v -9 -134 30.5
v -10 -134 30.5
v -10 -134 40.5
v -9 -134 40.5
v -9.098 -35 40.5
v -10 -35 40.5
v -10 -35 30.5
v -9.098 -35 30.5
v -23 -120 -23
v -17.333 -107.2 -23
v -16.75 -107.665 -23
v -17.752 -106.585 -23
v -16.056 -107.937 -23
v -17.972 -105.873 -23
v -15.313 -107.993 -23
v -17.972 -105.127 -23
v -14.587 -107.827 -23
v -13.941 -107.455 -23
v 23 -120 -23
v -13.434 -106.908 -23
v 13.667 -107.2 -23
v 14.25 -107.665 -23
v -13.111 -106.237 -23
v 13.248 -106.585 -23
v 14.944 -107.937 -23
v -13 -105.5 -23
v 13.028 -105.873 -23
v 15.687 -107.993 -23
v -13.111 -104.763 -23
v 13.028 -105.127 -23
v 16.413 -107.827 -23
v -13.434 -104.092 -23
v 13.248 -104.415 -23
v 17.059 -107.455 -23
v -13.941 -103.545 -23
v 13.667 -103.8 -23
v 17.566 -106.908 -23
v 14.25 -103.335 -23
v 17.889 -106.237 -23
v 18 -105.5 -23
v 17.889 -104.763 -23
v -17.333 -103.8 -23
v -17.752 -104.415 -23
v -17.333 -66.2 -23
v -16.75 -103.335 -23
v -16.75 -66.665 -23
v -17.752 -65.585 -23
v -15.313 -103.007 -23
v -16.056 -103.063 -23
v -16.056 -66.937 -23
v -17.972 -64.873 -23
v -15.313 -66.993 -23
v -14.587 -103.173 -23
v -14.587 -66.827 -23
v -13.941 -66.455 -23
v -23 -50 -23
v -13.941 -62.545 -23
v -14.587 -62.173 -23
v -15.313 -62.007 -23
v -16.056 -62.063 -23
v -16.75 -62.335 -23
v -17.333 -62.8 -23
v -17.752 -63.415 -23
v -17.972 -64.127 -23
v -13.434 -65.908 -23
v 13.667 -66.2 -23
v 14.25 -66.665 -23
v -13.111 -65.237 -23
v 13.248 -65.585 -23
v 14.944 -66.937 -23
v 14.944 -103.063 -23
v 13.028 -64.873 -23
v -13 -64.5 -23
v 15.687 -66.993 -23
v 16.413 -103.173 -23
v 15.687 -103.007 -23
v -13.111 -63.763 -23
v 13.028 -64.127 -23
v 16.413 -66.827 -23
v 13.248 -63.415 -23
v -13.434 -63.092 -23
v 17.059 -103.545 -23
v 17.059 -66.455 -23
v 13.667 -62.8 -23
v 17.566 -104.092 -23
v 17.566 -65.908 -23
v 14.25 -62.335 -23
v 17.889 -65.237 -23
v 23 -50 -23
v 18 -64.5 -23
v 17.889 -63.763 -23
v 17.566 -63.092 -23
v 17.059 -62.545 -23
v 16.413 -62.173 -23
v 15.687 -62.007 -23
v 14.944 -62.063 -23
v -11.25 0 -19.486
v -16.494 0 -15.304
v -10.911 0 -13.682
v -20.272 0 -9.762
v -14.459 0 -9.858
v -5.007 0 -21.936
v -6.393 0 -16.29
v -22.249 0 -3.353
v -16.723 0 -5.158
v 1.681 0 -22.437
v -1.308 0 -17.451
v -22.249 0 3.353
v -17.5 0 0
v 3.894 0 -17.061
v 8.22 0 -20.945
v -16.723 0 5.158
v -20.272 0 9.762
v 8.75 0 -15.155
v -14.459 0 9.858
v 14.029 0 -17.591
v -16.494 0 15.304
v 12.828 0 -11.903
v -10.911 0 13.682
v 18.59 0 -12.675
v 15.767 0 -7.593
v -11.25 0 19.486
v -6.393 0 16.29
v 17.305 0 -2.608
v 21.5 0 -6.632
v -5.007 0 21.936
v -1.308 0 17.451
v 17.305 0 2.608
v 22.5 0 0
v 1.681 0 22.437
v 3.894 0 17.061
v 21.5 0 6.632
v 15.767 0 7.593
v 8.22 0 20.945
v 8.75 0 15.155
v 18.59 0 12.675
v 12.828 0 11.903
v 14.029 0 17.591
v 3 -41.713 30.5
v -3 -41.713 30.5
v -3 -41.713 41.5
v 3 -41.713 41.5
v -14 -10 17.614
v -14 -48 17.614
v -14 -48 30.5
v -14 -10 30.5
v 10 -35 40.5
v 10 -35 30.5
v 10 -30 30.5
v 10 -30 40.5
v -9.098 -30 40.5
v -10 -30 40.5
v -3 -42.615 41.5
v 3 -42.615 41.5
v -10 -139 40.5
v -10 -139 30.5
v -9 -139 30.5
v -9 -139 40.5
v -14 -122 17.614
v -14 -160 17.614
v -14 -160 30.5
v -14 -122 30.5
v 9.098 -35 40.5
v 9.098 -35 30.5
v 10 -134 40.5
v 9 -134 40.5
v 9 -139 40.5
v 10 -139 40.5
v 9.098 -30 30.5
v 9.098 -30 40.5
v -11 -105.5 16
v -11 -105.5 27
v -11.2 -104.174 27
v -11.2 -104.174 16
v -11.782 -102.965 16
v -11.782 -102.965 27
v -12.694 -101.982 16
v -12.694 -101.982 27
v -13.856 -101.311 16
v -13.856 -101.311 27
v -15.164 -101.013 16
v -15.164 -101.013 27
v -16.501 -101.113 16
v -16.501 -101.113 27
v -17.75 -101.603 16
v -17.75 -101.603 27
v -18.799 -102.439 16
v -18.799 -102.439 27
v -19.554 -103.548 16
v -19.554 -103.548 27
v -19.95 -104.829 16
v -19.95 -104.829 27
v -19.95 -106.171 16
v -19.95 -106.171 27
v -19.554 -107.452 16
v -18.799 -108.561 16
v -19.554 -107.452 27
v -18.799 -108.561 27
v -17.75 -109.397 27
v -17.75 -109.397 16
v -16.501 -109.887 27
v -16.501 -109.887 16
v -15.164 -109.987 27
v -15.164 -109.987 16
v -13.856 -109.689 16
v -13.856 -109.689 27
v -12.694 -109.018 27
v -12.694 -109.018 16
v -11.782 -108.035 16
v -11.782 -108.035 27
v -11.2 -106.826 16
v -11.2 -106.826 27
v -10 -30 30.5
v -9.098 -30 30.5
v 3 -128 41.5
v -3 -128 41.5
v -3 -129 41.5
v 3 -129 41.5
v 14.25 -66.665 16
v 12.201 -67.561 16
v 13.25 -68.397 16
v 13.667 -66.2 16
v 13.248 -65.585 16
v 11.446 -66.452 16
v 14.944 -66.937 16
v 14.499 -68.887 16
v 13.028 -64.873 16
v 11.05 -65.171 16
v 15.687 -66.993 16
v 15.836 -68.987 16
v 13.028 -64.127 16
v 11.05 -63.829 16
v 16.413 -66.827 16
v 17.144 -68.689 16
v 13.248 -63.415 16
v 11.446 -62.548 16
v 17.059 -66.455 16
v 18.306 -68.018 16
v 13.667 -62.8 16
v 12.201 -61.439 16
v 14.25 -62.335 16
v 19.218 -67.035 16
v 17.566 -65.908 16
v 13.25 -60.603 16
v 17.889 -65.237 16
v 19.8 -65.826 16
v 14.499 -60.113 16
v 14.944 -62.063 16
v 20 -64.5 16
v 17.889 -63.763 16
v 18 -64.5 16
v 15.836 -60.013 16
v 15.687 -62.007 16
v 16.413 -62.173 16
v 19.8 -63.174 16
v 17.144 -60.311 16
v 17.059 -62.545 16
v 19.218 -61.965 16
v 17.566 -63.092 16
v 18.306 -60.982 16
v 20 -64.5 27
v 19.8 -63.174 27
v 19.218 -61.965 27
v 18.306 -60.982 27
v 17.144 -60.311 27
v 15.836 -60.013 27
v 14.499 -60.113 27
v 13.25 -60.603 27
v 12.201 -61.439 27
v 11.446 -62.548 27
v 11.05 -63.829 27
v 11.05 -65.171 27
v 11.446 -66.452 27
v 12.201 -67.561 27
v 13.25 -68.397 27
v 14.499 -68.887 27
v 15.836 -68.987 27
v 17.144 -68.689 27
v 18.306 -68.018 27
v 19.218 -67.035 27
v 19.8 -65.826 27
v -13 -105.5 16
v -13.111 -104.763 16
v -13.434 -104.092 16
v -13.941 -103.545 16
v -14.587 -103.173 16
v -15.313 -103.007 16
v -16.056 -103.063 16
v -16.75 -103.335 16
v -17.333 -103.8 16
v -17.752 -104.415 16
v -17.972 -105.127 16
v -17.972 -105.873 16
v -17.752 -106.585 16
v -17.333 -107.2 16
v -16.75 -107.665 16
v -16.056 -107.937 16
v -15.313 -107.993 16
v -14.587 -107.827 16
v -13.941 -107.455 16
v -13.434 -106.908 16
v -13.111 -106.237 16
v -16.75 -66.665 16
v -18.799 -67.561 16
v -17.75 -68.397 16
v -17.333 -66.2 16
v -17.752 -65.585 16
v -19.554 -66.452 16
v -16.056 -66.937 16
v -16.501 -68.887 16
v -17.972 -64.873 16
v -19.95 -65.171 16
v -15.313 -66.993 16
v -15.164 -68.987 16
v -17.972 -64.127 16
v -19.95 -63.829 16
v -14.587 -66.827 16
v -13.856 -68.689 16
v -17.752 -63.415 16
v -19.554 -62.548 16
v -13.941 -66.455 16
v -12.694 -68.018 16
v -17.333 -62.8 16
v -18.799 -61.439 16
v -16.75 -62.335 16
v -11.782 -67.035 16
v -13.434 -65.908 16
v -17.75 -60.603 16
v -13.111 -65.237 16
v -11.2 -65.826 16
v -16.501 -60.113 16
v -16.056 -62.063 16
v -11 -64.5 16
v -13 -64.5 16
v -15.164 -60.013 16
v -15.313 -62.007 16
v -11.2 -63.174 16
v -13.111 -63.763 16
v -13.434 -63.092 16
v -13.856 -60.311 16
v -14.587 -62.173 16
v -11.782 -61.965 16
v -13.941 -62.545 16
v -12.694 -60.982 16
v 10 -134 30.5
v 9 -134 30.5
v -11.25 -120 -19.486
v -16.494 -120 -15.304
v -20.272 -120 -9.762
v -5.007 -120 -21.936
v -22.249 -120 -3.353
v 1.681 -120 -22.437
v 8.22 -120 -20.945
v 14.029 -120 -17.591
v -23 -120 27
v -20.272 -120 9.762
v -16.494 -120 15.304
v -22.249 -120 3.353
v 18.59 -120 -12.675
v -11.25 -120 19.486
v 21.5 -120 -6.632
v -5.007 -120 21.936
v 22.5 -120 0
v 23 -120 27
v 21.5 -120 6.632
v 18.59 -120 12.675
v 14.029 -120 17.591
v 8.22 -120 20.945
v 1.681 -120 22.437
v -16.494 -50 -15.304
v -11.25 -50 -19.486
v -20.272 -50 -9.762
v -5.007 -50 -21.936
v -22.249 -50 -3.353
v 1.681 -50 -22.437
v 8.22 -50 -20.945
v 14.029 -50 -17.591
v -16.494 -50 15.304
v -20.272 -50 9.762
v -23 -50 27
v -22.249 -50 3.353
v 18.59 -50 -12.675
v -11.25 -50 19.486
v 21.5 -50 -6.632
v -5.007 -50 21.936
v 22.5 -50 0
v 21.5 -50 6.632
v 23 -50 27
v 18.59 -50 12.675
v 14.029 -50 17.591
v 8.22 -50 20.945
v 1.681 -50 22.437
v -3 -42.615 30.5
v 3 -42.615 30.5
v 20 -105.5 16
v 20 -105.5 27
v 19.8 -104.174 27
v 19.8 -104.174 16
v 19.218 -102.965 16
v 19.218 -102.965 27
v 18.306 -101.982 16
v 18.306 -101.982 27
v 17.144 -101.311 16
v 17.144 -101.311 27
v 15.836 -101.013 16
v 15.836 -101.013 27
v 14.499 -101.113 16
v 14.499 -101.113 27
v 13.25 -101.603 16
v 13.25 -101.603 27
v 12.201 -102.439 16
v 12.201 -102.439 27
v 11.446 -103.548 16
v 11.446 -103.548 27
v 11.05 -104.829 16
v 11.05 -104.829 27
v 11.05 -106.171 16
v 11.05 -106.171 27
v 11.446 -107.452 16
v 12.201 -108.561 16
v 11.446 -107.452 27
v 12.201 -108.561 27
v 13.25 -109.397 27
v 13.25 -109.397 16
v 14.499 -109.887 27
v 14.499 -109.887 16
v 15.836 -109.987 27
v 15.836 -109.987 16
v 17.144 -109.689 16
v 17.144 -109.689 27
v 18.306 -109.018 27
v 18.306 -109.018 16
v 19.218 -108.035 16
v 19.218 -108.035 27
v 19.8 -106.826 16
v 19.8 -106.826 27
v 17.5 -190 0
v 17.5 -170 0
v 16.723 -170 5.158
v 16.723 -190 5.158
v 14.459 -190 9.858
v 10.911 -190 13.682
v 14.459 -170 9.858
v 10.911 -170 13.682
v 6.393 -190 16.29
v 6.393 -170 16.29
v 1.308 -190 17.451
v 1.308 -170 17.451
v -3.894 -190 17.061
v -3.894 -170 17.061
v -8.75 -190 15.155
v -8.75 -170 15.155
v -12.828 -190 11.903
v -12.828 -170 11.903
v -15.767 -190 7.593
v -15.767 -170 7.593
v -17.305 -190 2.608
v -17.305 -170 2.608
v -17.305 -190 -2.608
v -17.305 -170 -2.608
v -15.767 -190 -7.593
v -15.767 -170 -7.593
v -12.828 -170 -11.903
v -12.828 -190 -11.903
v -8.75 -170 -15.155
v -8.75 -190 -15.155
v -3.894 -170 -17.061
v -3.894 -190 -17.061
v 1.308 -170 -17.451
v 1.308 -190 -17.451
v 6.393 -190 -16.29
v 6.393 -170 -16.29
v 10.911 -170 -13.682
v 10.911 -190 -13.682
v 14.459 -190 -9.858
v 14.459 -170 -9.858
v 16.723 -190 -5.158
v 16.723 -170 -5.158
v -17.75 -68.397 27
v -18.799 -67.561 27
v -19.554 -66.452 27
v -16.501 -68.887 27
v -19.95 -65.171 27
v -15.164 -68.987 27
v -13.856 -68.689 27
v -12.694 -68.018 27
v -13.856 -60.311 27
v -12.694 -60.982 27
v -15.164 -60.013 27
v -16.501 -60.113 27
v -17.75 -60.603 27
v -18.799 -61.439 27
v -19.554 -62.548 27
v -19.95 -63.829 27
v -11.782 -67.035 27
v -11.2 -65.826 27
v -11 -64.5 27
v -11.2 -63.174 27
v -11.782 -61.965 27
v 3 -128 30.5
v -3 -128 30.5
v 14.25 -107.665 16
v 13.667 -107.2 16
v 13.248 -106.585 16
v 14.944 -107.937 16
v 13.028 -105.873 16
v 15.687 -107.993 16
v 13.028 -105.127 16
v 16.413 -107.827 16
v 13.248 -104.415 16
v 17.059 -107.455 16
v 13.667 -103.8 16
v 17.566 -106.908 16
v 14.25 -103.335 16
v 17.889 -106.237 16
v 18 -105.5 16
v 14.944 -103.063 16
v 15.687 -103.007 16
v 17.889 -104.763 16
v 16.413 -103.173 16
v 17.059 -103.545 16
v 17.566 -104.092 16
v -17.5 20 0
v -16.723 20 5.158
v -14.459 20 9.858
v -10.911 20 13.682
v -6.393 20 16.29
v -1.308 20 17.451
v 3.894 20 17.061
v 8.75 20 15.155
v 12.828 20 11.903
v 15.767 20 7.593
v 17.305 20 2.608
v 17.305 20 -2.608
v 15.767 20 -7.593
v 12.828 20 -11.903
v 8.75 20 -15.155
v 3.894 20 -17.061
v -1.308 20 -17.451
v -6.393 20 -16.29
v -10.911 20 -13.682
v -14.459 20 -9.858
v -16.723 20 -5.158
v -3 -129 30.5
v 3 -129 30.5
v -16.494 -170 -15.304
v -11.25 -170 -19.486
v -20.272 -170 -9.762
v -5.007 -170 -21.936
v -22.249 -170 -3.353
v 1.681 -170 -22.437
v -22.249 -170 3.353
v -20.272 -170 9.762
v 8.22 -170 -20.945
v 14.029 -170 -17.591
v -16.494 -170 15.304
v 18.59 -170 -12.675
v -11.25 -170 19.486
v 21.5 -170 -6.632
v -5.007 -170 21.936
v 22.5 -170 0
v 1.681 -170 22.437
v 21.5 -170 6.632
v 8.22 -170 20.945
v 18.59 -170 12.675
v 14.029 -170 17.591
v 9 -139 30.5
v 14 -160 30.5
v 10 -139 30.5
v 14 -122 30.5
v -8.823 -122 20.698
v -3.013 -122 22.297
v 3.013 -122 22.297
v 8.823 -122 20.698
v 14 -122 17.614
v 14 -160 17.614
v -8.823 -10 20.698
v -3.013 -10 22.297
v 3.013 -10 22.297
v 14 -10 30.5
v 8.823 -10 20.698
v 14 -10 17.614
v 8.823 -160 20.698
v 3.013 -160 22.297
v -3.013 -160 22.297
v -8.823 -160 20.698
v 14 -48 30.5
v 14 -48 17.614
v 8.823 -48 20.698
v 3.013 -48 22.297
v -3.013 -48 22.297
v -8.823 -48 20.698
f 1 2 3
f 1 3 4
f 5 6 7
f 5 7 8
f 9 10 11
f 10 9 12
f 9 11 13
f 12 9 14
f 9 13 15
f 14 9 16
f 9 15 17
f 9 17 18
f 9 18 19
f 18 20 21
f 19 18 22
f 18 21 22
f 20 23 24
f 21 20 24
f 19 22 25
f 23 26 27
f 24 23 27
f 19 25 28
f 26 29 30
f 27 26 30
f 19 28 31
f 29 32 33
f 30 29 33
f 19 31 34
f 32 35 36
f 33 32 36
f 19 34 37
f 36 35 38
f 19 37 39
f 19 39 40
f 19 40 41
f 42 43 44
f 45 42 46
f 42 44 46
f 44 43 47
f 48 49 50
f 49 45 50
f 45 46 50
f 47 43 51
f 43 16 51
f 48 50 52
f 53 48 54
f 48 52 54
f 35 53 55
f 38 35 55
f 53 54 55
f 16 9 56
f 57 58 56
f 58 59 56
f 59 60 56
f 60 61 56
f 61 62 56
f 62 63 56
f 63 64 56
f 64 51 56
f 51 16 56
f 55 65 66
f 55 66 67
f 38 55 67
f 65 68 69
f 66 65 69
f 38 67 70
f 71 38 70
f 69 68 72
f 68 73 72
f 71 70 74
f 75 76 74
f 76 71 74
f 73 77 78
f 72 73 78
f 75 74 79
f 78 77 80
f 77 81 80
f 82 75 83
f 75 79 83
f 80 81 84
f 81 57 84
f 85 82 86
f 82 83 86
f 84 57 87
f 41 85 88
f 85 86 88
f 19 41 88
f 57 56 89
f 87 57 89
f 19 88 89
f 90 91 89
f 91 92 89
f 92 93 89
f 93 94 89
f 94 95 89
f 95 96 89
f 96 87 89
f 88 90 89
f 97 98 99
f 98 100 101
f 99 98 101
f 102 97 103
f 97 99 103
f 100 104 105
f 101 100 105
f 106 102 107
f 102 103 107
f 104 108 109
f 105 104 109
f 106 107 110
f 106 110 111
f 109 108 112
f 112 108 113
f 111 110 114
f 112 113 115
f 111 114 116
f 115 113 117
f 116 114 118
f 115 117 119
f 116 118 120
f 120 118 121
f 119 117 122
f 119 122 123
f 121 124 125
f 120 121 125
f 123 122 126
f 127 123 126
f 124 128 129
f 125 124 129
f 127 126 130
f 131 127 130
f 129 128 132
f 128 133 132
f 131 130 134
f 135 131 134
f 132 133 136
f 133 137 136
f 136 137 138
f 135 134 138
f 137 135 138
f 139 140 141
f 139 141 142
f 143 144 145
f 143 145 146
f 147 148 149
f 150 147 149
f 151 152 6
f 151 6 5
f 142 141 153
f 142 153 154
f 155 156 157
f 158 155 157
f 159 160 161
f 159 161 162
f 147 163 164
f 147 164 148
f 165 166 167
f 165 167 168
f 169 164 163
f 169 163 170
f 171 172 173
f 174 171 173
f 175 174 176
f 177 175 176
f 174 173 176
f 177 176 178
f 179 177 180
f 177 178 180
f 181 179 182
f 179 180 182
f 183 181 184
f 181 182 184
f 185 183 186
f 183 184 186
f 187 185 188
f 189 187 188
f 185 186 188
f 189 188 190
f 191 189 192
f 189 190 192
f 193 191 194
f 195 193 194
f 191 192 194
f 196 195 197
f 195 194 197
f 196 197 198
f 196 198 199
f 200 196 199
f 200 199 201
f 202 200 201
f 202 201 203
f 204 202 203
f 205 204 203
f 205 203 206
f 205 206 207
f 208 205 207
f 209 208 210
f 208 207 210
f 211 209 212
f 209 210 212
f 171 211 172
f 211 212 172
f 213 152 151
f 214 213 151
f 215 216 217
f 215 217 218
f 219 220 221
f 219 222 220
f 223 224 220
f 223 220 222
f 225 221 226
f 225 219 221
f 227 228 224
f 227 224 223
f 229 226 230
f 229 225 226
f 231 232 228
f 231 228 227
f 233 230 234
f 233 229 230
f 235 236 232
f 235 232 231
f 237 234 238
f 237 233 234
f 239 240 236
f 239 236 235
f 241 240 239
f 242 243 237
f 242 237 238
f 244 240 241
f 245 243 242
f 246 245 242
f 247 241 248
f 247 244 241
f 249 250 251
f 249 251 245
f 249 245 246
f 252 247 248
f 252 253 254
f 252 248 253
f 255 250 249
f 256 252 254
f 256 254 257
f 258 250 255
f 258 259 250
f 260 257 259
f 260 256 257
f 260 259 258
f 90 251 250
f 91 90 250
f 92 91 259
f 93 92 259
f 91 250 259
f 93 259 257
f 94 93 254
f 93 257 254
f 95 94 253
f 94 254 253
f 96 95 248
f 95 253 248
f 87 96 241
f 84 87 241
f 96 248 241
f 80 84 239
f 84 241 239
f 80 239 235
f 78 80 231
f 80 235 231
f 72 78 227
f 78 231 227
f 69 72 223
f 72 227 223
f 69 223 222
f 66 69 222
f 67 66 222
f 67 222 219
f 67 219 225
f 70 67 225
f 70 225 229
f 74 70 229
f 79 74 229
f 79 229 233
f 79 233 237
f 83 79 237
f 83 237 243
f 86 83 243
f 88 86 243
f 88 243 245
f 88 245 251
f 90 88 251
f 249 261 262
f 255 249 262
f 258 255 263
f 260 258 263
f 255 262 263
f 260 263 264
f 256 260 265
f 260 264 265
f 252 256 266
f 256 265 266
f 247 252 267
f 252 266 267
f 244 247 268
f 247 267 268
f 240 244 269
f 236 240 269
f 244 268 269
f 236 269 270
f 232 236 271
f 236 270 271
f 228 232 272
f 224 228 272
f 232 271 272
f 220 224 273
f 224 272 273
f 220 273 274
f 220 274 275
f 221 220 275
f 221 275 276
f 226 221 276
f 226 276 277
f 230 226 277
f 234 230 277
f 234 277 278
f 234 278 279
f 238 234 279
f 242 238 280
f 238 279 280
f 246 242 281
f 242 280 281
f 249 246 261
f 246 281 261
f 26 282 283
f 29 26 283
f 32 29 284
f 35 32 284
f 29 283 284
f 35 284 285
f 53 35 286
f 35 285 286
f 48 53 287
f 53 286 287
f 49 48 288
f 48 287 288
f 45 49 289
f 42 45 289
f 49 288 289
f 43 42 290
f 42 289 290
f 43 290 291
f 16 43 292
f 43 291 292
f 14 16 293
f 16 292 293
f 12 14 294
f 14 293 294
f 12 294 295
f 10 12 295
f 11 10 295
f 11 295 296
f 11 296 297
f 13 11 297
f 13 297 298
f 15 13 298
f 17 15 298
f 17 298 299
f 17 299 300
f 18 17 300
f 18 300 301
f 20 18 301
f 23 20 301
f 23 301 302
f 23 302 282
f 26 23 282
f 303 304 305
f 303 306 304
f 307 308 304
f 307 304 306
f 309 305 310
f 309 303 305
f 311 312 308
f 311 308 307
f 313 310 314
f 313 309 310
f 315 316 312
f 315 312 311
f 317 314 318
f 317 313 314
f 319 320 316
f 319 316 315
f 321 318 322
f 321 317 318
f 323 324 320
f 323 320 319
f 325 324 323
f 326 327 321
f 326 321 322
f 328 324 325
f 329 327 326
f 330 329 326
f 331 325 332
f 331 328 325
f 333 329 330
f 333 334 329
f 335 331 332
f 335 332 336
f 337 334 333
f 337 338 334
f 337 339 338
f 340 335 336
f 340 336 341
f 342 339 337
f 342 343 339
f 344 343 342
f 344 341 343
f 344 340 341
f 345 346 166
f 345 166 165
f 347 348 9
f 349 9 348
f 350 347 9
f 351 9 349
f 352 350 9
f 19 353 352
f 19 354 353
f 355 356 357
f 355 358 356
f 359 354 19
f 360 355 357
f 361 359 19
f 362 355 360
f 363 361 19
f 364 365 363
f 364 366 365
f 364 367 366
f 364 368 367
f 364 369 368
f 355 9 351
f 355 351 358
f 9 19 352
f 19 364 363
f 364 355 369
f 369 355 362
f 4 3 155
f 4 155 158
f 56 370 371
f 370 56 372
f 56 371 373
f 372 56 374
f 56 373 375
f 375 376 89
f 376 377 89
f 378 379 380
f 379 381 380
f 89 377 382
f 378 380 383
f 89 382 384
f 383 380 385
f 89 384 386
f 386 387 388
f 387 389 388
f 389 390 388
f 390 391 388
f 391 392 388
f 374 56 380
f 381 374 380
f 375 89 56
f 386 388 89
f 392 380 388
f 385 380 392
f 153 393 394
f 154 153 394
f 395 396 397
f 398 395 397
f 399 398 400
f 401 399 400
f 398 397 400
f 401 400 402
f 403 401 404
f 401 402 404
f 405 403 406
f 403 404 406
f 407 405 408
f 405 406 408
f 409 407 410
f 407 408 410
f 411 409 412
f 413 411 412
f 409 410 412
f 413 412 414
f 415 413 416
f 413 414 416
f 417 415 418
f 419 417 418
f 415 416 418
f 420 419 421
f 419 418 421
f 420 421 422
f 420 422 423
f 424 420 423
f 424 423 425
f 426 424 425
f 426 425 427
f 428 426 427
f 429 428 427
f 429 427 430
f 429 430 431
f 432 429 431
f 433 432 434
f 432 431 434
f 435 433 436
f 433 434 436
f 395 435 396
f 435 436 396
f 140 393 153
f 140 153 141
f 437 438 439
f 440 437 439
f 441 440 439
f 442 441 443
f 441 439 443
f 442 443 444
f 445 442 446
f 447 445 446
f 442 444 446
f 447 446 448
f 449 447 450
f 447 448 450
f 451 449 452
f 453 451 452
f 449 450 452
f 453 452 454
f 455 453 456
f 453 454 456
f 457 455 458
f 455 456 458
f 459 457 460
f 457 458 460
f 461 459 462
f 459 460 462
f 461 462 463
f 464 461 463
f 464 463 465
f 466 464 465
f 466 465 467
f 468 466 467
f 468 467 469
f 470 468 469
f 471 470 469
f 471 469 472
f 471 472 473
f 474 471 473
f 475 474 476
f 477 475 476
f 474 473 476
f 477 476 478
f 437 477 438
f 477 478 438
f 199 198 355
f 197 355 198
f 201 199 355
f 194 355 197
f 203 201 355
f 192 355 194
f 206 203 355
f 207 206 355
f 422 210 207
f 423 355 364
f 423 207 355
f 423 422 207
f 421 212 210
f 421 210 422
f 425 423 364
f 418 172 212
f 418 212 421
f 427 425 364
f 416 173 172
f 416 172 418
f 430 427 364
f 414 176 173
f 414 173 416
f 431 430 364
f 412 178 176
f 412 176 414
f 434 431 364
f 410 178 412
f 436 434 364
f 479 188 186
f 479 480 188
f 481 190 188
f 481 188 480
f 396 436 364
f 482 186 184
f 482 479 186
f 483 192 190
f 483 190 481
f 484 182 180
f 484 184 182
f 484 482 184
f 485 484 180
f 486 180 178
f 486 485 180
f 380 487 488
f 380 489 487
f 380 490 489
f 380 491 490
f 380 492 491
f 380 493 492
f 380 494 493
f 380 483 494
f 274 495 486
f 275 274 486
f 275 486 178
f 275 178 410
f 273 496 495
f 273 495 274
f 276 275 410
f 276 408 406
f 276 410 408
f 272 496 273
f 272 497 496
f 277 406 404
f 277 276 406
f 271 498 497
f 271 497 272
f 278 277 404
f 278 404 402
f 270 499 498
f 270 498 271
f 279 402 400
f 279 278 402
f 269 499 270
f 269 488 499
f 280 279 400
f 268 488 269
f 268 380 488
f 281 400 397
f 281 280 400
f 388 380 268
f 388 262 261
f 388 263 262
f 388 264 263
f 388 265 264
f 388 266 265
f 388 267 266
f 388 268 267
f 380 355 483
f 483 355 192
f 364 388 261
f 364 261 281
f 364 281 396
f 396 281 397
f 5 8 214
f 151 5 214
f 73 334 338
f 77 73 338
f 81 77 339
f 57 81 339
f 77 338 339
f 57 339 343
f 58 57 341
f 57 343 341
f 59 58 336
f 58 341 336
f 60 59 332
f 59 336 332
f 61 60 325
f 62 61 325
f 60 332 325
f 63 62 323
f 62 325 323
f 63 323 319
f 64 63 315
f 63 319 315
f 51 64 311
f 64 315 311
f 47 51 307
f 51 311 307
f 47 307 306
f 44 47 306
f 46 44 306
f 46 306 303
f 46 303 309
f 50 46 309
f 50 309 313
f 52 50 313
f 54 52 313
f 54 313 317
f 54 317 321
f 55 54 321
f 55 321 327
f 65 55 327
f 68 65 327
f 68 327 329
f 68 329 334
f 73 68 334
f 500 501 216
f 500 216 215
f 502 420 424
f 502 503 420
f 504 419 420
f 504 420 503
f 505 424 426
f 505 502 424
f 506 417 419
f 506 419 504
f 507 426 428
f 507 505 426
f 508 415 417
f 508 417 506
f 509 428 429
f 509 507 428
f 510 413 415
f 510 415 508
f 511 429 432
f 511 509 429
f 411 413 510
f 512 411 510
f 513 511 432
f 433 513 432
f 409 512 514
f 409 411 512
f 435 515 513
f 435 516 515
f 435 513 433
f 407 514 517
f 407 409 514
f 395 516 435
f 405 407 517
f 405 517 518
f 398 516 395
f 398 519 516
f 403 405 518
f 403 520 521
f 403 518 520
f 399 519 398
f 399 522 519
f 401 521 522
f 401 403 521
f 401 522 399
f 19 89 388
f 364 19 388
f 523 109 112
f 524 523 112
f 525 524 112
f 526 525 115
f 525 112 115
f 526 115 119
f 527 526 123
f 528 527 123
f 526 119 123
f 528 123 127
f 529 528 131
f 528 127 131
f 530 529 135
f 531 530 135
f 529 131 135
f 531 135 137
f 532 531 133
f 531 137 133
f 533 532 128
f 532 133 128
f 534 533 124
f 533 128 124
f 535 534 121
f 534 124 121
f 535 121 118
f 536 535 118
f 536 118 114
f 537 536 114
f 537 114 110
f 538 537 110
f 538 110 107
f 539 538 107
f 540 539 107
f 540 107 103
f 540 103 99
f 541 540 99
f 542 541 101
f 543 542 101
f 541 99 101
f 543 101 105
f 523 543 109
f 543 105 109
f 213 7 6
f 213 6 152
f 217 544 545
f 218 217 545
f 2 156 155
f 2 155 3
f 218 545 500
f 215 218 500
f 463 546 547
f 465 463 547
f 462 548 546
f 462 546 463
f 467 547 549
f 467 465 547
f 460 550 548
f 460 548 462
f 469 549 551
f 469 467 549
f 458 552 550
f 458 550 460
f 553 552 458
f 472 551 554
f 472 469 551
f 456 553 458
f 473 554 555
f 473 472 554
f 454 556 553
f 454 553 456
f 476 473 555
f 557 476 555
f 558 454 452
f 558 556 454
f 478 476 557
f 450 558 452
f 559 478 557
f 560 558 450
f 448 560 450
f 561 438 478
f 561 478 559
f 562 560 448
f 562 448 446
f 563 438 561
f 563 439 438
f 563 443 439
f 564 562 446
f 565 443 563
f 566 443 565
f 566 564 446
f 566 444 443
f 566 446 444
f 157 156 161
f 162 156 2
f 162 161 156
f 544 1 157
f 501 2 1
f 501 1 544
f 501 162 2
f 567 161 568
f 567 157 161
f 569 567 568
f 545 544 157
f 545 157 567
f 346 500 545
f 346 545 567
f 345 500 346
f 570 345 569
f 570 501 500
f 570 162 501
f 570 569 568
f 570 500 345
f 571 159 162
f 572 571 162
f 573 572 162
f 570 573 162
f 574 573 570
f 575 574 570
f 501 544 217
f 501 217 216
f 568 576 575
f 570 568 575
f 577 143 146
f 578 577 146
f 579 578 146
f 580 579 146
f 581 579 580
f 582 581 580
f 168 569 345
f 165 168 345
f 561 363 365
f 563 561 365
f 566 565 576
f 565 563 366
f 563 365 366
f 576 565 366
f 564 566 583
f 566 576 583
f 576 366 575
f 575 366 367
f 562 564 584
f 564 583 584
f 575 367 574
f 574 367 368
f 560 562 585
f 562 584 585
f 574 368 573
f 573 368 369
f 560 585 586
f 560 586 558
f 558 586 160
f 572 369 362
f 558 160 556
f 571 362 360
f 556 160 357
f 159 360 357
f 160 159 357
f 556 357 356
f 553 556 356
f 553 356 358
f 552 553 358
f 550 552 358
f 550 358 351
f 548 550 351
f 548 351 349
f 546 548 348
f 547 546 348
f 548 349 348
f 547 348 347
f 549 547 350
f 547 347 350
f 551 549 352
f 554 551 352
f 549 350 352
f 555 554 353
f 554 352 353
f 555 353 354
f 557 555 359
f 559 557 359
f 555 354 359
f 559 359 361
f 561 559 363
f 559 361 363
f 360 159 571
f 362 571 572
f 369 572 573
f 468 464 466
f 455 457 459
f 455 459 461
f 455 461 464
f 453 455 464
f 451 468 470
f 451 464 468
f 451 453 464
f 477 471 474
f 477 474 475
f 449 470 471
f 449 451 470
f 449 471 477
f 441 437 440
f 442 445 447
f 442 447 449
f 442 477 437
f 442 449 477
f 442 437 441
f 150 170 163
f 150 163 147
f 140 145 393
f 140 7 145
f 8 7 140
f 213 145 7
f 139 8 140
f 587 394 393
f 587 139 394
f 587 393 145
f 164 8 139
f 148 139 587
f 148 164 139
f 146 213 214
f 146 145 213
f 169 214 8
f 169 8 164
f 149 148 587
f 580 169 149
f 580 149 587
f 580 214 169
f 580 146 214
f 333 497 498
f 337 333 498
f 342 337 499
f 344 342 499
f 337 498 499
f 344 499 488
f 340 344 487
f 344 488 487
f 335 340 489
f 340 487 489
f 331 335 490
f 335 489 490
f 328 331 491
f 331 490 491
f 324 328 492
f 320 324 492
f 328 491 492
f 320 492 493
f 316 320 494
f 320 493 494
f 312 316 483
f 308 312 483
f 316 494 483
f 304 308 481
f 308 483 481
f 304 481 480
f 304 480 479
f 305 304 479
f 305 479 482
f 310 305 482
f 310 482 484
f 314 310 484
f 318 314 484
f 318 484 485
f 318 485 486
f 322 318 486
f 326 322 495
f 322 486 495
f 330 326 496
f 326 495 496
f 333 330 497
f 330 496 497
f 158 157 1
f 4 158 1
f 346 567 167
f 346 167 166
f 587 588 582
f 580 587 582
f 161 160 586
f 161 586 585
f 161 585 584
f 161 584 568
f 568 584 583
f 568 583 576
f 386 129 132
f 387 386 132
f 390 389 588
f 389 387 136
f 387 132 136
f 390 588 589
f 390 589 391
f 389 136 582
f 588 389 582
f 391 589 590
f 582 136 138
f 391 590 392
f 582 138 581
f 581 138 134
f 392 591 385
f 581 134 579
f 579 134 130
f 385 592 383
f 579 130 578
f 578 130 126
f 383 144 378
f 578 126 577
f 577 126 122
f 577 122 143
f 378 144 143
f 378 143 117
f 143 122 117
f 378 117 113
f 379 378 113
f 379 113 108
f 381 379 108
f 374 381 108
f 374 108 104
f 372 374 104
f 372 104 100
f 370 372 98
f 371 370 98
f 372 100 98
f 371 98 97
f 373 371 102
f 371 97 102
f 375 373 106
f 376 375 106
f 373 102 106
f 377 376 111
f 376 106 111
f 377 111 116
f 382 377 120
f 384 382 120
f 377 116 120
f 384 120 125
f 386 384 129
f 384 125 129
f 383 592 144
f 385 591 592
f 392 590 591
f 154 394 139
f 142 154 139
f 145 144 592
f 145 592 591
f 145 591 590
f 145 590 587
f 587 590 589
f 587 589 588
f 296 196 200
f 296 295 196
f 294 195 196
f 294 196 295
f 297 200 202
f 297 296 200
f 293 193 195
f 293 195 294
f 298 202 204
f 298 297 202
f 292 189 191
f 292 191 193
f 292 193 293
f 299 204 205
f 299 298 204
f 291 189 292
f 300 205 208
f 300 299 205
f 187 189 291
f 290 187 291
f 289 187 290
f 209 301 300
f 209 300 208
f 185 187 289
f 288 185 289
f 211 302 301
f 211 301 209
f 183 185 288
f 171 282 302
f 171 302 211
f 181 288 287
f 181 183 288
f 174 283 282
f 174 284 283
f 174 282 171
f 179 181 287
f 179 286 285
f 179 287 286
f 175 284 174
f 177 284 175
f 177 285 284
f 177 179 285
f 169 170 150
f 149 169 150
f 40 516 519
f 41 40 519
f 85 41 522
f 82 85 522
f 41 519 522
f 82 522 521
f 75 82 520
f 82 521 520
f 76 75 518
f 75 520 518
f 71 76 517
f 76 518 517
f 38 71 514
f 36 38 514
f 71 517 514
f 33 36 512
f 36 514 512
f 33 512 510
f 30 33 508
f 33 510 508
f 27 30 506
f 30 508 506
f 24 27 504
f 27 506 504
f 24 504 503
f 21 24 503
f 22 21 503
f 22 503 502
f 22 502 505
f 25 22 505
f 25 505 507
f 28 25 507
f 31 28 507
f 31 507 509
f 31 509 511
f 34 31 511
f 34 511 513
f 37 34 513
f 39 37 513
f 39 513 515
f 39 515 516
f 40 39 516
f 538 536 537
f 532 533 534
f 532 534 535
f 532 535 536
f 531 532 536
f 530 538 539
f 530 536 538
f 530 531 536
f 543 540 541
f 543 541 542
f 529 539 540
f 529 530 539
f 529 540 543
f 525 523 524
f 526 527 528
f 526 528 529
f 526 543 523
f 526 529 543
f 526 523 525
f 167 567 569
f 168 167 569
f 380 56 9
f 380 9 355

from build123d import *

# Parameters (mm, degrees)
F0_R      = 22.5
F1_DEPTH  = 50
F2_W      = 46
F2_H      = 50
F2_R      = 22.5
F3_DEPTH  = 70
F4_R      = 22.5
F5_DEPTH  = 50
F6_R      = 17.5
F7_DEPTH  = 20
F8_R      = 17.5
F9_DEPTH  = 20
F10_W     = 28
F10_H     = 38
F11_DEPTH = 30.5
F12_W     = 28
F12_H     = 38
F13_DEPTH = 30.5
F15_R     = 2.5
F16_DEPTH = 50
F14_R     = 4.5
F17_DEPTH = 11
F18_W     = 6
F18_H     = 0.9020372182
F19_DEPTH = 11
F20_W     = 6
F20_H     = 1
F21_DEPTH = 11
F20_W_2   = 1
F20_H_2   = 5
F22_DEPTH = 10
F18_W_2   = 0.9020372182
F18_H_2   = 5
F23_DEPTH = 10


# Not quite as in the source:
# - a feature names something its author has since deleted; it is built from what else it names


with BuildPart() as f1:
    # F0 (on Front) → F1 (new body)
    with BuildSketch(Plane.XZ):
        Circle(F0_R)
    extrude(amount=F1_DEPTH)

    # F2 (on face) → F3 (join)
    with BuildSketch(Plane.XZ.offset(50)):
        with Locations((0, 2)):
            Rectangle(F2_W, F2_H)
        Circle(F2_R, mode=Mode.SUBTRACT)
        Circle(F2_R)
    extrude(amount=F3_DEPTH)

    # F4 (on face) → F5 (join)
    with BuildSketch(Plane.XZ.offset(120)):
        Circle(F4_R)
    extrude(amount=F5_DEPTH)

    # F6 (on face) → F7 (join)
    with BuildSketch(Plane.XZ.offset(170)):
        Circle(F6_R)
    extrude(amount=F7_DEPTH)

    # F8 (on face) → F9 (join)
    with BuildSketch(Plane(origin=(0, 0, 0), x_dir=(-1, 0, 0), z_dir=(0, 1, 0))):
        Circle(F8_R)
    extrude(amount=F9_DEPTH)

    # F10 (on Top) → F11 (join)
    with BuildSketch(Plane.XY):
        with Locations((0, -29)):
            Rectangle(F10_W, F10_H)
    extrude(amount=F11_DEPTH)

    # F12 (on Top) → F13 (join)
    with BuildSketch(Plane.XY):
        with Locations((0, -141)):
            Rectangle(F12_W, F12_H)
    extrude(amount=F13_DEPTH)

    # F15 (on face) → F16 (cut)
    with BuildSketch(Plane.XY.offset(27)):
        with Locations((-15.5, -64.5)):
            Circle(F15_R)
        with Locations((-15.5, -105.5)):
            Circle(F15_R)
        with Locations((15.5, -105.5)):
            Circle(F15_R)
        with Locations((15.5, -64.5)):
            Circle(F15_R)
    extrude(amount=-F16_DEPTH, mode=Mode.SUBTRACT)

    # F14 (on face) → F17 (cut)
    with BuildSketch(Plane.XY.offset(27)):
        with Locations((-15.5, -64.5)):
            Circle(F14_R)
        with Locations((15.5, -64.5)):
            Circle(F14_R)
        with Locations((15.5, -105.5)):
            Circle(F14_R)
        with Locations((-15.5, -105.5)):
            Circle(F14_R)
    extrude(amount=-F17_DEPTH, mode=Mode.SUBTRACT)

    # F18 (on face) → F19 (join)
    with BuildSketch(Plane.XY.offset(30.5)):
        with Locations((0, -42.164042592)):
            Rectangle(F18_W, F18_H)
    extrude(amount=F19_DEPTH)

    # F20 (on face) → F21 (join)
    with BuildSketch(Plane.XY.offset(30.5)):
        with Locations((0, -128.5)):
            Rectangle(F20_W, F20_H)
    extrude(amount=F21_DEPTH)

    # F20 (on face) → F22 (join)
    with BuildSketch(Plane.XY.offset(30.5)):
        with Locations((9.5, -136.5)):
            Rectangle(F20_W_2, F20_H_2)
        with Locations((0, -128.5)):
            Rectangle(F20_W, F20_H)
        with Locations((-9.5, -136.5)):
            Rectangle(F20_W_2, F20_H_2)
    extrude(amount=F22_DEPTH)

    # F18 (on face) → F23 (join)
    with BuildSketch(Plane.XY.offset(30.5)):
        with Locations((-9.5489813909, -32.5)):
            Rectangle(F18_W_2, F18_H_2)
        with Locations((9.5489813909, -32.5)):
            Rectangle(F18_W_2, F18_H_2)
        with Locations((0, -42.164042592)):
            Rectangle(F18_W, F18_H)
    extrude(amount=F23_DEPTH)


solid = f1.part
